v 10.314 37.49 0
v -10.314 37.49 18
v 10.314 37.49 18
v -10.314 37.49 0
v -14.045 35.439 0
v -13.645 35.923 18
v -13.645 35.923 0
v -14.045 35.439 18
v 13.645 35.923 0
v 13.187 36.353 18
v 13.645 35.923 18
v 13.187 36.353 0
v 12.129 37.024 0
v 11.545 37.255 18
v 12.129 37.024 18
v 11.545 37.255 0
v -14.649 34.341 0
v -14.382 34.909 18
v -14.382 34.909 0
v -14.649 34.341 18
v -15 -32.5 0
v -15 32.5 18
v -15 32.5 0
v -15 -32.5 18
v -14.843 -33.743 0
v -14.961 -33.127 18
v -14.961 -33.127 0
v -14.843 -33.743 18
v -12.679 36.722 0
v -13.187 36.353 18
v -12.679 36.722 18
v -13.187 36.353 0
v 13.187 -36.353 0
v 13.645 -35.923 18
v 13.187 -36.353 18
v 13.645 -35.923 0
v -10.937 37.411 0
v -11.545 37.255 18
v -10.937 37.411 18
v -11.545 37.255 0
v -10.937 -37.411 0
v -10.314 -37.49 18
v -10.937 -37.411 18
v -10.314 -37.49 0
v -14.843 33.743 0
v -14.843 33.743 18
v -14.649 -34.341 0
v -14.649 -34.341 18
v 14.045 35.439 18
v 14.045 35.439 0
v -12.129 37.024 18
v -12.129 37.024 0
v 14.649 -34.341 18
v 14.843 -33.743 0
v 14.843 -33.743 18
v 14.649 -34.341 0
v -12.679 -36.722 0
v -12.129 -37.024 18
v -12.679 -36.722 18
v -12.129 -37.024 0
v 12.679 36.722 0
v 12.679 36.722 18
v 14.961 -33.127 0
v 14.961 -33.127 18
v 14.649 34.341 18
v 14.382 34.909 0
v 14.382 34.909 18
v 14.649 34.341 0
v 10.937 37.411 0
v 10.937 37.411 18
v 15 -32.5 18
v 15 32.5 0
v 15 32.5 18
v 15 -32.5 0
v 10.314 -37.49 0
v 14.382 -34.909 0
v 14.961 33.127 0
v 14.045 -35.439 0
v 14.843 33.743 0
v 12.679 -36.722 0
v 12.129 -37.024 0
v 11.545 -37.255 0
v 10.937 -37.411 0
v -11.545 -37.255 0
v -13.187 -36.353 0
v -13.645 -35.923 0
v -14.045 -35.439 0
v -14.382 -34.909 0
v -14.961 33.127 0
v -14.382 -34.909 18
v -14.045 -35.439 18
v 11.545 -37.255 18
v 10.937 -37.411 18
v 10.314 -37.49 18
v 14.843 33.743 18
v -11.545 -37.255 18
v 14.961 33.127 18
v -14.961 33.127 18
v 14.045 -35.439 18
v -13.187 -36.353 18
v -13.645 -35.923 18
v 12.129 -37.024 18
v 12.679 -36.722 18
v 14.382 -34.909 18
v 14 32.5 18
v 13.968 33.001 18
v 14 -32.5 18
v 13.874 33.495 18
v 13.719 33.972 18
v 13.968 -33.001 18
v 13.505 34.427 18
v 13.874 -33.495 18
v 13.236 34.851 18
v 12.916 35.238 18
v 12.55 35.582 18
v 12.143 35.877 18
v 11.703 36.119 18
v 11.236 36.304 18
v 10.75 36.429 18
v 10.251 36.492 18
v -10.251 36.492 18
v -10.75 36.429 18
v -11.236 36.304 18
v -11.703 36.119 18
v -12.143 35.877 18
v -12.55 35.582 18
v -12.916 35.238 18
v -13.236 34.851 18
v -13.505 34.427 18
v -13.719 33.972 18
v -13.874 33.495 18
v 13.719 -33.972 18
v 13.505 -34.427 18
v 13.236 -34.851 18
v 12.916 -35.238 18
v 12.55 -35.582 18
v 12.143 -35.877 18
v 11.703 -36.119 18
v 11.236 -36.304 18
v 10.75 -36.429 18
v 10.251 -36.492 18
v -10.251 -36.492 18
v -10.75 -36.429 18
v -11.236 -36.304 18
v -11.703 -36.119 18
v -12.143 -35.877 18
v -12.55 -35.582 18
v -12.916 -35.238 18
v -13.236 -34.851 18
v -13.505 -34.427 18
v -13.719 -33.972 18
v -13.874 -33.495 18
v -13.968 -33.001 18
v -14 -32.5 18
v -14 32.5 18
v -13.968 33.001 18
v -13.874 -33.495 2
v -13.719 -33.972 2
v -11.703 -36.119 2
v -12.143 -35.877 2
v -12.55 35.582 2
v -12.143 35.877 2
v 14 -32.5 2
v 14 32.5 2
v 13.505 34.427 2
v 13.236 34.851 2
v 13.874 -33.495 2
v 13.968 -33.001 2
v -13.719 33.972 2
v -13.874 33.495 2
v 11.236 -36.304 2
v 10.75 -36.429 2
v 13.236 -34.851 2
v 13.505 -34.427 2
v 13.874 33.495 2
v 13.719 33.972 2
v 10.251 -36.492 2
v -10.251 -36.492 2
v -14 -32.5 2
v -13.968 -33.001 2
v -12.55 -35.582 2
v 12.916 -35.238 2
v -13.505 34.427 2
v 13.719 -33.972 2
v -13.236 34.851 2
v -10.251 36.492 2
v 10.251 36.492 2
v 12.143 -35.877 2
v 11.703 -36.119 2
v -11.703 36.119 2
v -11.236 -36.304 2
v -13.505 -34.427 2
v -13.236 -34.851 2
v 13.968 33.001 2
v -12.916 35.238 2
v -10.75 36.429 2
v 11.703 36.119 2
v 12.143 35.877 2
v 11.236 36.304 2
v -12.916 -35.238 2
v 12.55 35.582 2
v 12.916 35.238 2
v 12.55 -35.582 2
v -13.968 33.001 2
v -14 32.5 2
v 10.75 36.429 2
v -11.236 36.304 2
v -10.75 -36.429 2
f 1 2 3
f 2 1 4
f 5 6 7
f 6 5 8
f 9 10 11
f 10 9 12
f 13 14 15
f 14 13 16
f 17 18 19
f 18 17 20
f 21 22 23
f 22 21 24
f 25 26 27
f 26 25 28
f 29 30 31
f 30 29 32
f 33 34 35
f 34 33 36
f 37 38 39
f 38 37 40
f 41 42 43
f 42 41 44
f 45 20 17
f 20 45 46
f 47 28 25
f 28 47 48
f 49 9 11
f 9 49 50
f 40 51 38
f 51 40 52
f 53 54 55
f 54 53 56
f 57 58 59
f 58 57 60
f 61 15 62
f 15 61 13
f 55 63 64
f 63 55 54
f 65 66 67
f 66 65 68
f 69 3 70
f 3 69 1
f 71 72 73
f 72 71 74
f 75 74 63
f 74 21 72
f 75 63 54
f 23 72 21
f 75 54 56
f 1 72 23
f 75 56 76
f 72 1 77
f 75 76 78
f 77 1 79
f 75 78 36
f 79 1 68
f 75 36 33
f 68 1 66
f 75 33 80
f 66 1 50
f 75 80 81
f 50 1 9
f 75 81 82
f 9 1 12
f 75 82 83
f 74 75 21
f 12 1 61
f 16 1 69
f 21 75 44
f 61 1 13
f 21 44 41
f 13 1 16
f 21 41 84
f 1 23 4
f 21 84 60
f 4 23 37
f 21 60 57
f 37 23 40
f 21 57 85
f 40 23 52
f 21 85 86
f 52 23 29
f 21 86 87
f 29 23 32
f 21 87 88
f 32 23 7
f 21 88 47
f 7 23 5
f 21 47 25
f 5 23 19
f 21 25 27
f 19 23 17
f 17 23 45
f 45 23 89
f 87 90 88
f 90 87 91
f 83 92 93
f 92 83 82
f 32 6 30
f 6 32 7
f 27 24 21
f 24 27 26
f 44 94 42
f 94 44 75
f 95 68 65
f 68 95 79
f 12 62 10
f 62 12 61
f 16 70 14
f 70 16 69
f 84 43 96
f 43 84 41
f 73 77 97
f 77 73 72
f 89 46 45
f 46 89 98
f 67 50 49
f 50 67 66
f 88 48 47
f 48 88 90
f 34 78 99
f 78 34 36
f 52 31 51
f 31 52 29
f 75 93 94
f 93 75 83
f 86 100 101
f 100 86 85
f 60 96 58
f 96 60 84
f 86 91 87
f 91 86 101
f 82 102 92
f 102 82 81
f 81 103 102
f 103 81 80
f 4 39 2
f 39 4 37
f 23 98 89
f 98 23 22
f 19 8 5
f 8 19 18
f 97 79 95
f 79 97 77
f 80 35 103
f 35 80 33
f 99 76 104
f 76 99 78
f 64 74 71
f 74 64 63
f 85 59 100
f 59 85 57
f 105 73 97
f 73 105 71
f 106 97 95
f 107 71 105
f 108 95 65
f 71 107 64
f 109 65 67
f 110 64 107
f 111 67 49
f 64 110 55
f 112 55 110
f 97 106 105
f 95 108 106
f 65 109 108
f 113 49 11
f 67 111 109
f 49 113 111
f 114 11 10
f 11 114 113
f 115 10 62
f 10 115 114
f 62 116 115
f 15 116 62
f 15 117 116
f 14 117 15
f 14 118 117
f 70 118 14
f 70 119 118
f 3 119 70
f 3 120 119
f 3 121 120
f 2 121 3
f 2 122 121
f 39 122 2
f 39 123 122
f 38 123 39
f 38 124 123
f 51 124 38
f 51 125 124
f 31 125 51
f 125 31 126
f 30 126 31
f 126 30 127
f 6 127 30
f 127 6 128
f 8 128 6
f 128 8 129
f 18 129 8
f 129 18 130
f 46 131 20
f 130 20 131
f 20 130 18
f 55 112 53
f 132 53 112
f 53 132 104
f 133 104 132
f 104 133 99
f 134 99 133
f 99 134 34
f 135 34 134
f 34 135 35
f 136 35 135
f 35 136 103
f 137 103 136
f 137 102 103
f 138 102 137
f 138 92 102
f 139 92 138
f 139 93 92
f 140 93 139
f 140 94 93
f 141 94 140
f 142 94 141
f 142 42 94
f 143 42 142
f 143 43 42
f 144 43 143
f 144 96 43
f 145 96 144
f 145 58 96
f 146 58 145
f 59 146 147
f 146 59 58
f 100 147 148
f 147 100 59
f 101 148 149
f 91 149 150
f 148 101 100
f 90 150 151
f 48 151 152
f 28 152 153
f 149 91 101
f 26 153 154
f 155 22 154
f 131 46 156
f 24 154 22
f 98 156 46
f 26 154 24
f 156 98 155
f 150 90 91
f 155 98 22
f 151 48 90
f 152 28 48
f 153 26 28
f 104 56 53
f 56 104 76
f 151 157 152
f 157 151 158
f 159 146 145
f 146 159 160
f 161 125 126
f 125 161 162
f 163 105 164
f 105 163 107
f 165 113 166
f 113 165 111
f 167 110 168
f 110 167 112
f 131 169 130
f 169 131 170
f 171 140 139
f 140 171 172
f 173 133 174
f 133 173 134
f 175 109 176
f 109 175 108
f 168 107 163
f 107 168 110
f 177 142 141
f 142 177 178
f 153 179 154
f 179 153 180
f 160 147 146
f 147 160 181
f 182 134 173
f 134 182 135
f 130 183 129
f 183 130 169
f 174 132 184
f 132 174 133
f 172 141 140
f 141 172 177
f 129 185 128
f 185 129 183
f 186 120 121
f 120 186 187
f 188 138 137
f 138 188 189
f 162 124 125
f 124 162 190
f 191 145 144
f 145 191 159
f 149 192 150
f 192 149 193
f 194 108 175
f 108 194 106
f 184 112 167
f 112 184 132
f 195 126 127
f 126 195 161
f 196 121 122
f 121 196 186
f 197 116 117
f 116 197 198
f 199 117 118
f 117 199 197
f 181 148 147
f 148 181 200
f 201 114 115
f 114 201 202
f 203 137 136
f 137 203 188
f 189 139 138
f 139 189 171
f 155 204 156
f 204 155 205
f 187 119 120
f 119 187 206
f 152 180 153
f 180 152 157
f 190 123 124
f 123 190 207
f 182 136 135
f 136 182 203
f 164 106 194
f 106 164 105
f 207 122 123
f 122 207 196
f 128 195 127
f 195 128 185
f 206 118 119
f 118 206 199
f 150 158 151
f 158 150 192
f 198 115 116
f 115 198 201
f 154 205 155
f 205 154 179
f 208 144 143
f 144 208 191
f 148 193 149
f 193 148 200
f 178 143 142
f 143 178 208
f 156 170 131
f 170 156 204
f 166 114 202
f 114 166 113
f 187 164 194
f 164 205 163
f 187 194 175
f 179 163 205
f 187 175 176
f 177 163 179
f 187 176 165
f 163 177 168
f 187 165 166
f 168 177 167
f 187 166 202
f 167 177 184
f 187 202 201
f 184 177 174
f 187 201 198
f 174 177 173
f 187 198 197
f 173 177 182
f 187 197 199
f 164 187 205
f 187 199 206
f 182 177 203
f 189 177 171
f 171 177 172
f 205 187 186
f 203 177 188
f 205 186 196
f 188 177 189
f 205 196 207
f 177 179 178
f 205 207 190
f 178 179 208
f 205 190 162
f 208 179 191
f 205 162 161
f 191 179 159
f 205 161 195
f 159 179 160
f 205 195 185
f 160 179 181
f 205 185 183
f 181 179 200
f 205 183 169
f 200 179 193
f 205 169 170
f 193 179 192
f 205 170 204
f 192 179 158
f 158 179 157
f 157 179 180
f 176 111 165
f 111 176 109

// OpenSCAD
$fn = 50;


difference() {
	union() {
		hull() {
			translate(v = [-10.0000000000, 32.5000000000, 0]) {
				cylinder(h = 18, r = 5);
			}
			translate(v = [10.0000000000, 32.5000000000, 0]) {
				cylinder(h = 18, r = 5);
			}
			translate(v = [-10.0000000000, -32.5000000000, 0]) {
				cylinder(h = 18, r = 5);
			}
			translate(v = [10.0000000000, -32.5000000000, 0]) {
				cylinder(h = 18, r = 5);
			}
		}
	}
	union() {
		translate(v = [0, 0, 2]) {
			hull() {
				translate(v = [-10.0000000000, 32.5000000000, 0]) {
					cylinder(h = 16, r = 4);
				}
				translate(v = [10.0000000000, 32.5000000000, 0]) {
					cylinder(h = 16, r = 4);
				}
				translate(v = [-10.0000000000, -32.5000000000, 0]) {
					cylinder(h = 16, r = 4);
				}
				translate(v = [10.0000000000, -32.5000000000, 0]) {
					cylinder(h = 16, r = 4);
				}
			}
		}
	}
}
